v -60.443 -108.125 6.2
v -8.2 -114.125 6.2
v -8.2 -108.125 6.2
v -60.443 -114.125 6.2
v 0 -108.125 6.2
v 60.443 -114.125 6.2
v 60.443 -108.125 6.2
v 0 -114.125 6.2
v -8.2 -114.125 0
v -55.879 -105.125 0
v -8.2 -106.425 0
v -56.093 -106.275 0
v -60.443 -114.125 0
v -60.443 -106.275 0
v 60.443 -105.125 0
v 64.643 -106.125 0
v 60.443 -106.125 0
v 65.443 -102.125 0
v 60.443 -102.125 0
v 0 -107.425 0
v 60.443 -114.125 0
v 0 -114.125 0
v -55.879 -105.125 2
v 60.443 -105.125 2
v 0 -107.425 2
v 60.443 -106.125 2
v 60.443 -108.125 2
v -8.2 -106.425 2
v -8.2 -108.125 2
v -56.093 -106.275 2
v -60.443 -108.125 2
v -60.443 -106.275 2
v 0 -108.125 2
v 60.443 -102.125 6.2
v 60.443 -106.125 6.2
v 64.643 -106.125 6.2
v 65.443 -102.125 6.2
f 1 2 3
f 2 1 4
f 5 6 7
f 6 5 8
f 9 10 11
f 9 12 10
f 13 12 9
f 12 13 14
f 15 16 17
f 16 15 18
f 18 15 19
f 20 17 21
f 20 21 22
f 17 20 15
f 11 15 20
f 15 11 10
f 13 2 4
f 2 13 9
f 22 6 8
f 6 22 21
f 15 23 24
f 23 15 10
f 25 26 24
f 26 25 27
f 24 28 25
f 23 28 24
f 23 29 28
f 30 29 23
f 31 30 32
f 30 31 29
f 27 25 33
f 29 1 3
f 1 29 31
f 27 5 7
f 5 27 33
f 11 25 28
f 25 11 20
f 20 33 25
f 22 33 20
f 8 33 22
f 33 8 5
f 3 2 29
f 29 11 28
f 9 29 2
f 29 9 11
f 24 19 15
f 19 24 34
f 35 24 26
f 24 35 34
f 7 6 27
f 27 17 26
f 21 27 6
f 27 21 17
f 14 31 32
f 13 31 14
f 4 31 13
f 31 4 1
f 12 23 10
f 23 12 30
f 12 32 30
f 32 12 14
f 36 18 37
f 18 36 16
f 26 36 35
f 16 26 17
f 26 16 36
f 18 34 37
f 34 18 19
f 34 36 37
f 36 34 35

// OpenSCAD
// ============================================
// Plate 10: 프레임 - 하단 중앙 (BC)
// 크기: ~121 x ~114 mm (OK)
// ============================================
use <../src/model_a_frame.scad>

frame_seg_BC();
